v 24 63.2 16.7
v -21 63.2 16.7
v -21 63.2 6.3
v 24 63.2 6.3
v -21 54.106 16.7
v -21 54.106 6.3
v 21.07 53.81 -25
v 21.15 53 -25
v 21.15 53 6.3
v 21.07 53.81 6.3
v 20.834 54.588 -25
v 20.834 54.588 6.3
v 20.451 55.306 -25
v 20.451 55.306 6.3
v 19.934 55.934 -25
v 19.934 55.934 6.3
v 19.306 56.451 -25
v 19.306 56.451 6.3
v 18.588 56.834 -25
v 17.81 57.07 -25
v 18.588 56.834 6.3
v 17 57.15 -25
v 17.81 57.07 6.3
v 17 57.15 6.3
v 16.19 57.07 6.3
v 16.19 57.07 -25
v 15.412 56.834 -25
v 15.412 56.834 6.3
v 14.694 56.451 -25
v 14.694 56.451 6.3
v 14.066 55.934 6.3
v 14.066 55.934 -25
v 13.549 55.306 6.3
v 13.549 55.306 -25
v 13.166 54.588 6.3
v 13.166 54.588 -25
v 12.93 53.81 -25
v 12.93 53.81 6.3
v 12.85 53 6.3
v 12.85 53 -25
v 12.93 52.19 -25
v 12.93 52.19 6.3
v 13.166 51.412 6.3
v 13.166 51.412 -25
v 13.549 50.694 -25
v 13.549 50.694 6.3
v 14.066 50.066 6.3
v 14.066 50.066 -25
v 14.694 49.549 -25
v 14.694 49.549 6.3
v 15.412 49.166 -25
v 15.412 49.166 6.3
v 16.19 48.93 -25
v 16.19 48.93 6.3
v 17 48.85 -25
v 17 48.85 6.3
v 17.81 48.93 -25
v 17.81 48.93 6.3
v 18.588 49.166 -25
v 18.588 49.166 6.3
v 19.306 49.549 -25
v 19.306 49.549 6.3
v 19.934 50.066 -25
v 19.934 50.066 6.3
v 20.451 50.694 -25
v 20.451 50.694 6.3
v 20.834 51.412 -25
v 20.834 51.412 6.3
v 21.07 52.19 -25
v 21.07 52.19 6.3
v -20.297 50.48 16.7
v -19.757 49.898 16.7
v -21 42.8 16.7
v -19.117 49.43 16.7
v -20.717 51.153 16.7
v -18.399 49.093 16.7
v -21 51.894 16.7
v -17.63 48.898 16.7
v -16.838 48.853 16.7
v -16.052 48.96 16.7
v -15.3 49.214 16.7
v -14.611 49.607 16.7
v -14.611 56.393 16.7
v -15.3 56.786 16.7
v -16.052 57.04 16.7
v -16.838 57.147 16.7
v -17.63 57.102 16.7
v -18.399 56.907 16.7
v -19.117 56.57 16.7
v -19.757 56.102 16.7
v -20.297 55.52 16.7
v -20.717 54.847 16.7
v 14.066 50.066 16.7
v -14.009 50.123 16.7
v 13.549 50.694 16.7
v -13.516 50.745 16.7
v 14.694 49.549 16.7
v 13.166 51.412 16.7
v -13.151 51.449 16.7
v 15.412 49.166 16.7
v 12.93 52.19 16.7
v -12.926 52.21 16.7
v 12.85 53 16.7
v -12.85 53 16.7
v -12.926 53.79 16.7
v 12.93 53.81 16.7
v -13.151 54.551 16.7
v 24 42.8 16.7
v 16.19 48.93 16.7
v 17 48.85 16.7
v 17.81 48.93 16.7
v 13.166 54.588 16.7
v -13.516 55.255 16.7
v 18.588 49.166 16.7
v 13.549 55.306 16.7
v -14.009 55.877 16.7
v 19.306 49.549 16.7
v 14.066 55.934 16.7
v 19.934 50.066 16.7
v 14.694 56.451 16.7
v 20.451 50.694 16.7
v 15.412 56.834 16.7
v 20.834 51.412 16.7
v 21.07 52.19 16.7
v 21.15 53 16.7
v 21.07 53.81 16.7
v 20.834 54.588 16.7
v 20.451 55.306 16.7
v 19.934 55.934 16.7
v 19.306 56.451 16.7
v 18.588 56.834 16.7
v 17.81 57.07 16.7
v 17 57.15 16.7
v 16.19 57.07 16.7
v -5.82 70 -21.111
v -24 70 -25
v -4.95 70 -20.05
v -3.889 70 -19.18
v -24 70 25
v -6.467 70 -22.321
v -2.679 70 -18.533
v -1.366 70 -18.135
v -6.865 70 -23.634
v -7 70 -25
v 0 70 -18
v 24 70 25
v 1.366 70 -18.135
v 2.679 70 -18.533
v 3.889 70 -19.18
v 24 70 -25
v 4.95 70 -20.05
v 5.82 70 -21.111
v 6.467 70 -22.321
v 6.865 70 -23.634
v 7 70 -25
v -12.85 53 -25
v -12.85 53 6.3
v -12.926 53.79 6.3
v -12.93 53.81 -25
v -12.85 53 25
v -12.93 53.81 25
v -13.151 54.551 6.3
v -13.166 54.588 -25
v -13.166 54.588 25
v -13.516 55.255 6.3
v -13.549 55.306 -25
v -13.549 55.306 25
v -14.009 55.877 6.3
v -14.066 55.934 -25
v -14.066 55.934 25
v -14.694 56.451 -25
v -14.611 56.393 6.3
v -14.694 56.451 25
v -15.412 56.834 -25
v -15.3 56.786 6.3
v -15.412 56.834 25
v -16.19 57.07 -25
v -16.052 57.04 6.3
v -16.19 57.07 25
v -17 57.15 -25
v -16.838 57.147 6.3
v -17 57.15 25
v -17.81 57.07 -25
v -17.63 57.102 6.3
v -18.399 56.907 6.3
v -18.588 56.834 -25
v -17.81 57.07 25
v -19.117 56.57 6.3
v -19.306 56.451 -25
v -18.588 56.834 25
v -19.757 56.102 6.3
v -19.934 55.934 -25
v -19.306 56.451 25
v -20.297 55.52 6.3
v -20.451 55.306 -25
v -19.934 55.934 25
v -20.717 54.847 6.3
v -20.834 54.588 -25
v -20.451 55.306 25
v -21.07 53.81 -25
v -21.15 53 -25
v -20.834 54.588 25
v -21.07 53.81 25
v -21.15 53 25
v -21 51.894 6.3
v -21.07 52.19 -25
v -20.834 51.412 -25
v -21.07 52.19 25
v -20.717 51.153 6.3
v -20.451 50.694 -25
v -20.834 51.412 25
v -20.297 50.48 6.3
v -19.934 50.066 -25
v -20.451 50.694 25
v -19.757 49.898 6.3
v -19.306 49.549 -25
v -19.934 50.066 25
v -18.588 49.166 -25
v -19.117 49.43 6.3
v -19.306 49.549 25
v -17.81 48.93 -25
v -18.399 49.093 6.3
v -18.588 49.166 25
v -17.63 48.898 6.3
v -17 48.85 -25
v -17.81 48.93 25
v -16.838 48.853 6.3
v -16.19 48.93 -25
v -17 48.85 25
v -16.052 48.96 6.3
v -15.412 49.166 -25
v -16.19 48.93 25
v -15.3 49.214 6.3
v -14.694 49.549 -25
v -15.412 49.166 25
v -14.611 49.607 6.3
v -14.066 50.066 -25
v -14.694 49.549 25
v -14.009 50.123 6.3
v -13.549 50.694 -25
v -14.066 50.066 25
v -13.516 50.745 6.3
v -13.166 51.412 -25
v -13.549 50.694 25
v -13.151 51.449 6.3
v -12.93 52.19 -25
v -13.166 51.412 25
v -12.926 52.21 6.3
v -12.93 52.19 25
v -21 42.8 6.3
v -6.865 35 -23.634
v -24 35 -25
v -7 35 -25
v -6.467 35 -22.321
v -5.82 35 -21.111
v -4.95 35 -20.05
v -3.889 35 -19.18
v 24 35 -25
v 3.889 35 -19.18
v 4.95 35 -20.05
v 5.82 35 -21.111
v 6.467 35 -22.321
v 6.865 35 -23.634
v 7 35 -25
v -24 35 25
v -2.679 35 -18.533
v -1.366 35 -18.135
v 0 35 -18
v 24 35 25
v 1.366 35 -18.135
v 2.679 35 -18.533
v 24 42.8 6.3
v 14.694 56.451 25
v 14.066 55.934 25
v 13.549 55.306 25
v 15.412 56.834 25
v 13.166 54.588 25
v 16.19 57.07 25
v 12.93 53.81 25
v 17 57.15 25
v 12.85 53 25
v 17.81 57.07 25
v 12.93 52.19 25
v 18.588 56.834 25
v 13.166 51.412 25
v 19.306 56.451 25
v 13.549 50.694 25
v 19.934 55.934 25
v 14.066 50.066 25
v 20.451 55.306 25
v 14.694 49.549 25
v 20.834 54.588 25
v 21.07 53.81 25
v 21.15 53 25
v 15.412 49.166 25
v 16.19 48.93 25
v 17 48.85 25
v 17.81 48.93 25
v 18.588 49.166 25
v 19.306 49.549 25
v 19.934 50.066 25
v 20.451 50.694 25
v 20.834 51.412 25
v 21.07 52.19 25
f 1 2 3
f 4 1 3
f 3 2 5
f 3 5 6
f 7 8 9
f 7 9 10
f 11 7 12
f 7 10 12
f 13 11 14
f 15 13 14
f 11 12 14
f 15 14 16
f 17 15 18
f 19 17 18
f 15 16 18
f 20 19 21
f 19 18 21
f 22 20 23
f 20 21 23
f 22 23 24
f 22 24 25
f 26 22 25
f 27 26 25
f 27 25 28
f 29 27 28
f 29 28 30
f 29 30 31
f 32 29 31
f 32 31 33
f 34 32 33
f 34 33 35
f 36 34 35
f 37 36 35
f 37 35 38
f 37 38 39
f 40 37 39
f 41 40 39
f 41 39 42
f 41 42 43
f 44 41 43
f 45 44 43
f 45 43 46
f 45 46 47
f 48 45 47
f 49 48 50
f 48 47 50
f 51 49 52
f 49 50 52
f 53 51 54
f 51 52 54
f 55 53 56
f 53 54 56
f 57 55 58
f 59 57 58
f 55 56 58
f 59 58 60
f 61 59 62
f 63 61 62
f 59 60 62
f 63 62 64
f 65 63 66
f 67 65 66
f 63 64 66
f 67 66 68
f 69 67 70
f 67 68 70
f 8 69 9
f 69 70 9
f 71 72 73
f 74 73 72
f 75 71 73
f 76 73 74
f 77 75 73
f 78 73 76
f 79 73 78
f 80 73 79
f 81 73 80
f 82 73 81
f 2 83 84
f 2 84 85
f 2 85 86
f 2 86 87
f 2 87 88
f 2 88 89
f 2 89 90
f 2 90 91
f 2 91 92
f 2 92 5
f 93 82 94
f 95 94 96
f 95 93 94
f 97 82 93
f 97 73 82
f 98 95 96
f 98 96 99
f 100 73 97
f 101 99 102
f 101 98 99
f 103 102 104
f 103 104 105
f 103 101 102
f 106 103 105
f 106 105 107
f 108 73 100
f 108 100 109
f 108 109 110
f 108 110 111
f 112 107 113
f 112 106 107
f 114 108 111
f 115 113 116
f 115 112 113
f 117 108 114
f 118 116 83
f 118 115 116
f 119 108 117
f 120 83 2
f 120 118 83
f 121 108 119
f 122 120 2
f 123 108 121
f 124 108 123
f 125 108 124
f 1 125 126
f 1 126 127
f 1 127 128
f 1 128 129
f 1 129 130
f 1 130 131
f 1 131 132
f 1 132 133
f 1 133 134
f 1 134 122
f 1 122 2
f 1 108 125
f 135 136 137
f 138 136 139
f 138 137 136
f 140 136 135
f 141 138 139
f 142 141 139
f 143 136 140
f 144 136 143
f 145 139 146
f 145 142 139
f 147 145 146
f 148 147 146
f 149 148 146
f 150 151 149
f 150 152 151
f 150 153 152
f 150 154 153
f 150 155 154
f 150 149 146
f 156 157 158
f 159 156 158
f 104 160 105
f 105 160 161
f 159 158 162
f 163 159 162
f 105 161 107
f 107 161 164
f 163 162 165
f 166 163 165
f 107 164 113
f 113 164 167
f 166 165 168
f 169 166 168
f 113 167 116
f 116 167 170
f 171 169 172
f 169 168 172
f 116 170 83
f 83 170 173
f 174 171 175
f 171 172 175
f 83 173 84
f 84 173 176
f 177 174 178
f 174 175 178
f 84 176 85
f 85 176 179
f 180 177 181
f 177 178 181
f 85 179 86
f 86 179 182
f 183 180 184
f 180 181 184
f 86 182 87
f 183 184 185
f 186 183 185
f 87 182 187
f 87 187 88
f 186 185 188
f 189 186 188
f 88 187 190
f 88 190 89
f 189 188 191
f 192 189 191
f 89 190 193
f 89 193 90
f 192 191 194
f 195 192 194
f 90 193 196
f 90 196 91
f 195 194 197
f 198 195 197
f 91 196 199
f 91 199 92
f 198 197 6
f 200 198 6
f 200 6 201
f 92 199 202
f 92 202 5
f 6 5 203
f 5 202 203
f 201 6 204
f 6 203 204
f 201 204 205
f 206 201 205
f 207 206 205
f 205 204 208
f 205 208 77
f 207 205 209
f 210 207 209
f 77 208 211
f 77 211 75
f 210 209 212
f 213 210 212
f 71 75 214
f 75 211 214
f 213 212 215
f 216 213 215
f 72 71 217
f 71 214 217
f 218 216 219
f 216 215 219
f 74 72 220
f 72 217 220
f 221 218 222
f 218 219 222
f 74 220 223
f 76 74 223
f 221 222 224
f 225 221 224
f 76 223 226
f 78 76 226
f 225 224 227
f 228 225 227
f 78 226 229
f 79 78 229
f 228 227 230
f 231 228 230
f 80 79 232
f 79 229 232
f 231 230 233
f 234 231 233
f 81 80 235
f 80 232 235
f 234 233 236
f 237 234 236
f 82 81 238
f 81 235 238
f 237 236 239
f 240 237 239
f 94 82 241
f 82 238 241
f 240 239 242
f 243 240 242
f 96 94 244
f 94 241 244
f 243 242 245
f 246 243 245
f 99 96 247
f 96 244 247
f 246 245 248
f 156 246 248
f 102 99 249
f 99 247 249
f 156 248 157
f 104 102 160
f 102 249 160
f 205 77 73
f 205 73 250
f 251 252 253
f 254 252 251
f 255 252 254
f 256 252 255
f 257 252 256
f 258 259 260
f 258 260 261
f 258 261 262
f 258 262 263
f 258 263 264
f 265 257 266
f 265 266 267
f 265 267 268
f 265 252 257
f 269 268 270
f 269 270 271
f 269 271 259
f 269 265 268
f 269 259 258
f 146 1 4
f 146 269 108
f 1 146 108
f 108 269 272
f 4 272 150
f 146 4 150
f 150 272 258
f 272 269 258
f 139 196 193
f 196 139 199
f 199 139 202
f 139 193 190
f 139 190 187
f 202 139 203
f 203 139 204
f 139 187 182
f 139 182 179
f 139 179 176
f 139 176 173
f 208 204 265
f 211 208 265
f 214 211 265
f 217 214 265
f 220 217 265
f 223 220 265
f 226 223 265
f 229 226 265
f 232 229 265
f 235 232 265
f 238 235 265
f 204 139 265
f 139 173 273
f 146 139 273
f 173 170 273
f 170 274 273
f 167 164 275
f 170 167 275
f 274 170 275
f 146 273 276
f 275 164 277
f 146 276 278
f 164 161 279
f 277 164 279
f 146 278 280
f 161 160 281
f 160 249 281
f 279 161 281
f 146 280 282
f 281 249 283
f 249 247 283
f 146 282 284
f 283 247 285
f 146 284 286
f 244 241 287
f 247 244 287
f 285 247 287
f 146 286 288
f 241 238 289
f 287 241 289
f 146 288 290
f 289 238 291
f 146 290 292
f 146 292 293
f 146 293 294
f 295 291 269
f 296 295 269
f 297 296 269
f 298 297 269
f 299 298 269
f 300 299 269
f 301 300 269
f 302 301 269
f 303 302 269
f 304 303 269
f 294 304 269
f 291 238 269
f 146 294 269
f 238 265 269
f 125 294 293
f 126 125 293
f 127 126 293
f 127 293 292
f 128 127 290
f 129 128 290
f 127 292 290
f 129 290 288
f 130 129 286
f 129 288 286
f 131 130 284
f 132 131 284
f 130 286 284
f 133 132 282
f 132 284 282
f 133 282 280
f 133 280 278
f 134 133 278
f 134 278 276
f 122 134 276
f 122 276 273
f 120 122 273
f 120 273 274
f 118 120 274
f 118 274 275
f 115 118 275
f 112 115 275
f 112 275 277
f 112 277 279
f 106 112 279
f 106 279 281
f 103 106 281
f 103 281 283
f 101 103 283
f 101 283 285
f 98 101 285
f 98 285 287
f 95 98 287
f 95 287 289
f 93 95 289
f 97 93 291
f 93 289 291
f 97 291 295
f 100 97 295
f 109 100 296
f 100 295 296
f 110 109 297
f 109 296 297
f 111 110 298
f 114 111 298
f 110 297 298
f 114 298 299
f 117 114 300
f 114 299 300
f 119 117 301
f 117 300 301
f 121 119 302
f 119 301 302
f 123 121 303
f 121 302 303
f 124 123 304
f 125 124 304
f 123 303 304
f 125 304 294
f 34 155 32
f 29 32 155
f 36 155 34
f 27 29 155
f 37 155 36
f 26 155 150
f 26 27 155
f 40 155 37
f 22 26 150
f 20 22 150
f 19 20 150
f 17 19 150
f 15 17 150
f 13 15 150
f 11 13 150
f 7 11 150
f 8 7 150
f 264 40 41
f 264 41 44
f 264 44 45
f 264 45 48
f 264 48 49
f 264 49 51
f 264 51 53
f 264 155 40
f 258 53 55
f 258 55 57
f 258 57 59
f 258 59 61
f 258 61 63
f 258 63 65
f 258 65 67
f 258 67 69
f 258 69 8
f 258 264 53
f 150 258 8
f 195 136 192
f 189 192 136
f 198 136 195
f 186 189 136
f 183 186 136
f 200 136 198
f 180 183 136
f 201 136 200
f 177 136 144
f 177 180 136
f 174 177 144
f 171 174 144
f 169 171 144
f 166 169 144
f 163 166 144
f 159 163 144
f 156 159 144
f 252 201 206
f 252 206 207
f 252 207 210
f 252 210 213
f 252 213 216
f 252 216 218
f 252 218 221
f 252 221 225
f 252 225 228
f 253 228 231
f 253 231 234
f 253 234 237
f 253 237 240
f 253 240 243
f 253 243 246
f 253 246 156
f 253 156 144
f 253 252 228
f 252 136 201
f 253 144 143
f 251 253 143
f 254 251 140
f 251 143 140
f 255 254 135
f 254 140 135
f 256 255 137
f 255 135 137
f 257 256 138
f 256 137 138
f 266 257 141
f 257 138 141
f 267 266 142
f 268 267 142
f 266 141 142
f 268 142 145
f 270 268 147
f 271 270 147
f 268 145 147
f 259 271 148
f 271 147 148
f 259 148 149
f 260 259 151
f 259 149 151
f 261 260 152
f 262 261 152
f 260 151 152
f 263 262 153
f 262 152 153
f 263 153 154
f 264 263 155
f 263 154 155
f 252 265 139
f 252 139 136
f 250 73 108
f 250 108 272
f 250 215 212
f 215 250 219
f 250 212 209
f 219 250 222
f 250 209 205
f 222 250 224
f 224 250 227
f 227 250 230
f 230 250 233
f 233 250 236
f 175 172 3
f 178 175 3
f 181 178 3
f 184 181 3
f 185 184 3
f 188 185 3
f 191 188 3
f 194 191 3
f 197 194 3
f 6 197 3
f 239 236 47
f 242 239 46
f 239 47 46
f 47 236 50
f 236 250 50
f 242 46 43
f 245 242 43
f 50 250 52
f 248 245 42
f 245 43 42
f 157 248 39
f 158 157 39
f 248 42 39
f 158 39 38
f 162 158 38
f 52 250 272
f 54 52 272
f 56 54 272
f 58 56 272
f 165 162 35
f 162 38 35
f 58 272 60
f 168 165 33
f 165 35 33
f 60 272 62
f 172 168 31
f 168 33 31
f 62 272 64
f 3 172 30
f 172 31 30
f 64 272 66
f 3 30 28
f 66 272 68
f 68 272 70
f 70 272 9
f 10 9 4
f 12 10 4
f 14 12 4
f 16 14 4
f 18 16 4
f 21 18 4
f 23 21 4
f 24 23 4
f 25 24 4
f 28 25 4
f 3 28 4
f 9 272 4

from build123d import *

# Parameters (mm, degrees)
SKETCH1_W               = 48
SKETCH1_H               = 50
BOSS_EXTRUDE1_DEPTH     = 70
SKETCH2_W               = 10.4
SKETCH2_H               = 20.4
CUT_EXTRUDE1_DEPTH      = 45
SKETCH3_R               = 4.15
CUT_EXTRUDE2_DEPTH      = 51
CUT_EXTRUDE3_DEPTH      = 1
CUT_EXTRUDE3_DEPTH_BACK = 71
SKETCH5_W               = 48
SKETCH5_H               = 50
CUT_EXTRUDE4_DEPTH      = 35


with BuildPart() as part:
    # Sketch1 → Boss-Extrude1 (new body)
    with BuildSketch(Plane(origin=(0, 0, 0), x_dir=(1, 0, 0), z_dir=(0, 1, 0))):
        Rectangle(SKETCH1_W, SKETCH1_H)
    extrude(amount=BOSS_EXTRUDE1_DEPTH)

    # Sketch2 → Cut-Extrude1 (cut)
    with BuildSketch(Plane(origin=(24, 0, 0), x_dir=(0, 0, -1), z_dir=(1, 0, 0))):
        with Locations((-11.5, 53)):
            Rectangle(SKETCH2_W, SKETCH2_H)
        with Locations((-11.5, 17)):
            Rectangle(SKETCH2_W, SKETCH2_H)
    extrude(amount=-CUT_EXTRUDE1_DEPTH, mode=Mode.SUBTRACT)

    # Sketch3 → Cut-Extrude2 (cut, through all)
    with BuildSketch(Plane.XY.offset(25)):
        with Locations((17, 53)):
            Circle(SKETCH3_R)
        with Locations((-17, 53)):
            Circle(SKETCH3_R)
        with Locations((-17, 17)):
            Circle(SKETCH3_R)
        with Locations((17, 17)):
            Circle(SKETCH3_R)
    extrude(amount=-CUT_EXTRUDE2_DEPTH, mode=Mode.SUBTRACT)

    # Sketch4 → Cut-Extrude3 (cut, two sides)
    with BuildSketch(Plane(origin=(0, 70, 0), x_dir=(1, 0, 0), z_dir=(0, 1, 0))) as cut_extrude3_sk:
        with BuildLine():
            Line((-7, 152.660528641), (-7, 25))
            ThreePointArc((-7, 25), (0, 18), (7, 25))
            Line((7, 25), (7, 152.660528641))
            Line((7, 152.660528641), (7, 407.981585922))
            Line((7, 407.981585922), (-7, 407.981585922))
            Line((-7, 407.981585922), (-7, 152.660528641))
        make_face()
    extrude(amount=CUT_EXTRUDE3_DEPTH, mode=Mode.SUBTRACT)
    extrude(cut_extrude3_sk.sketch, amount=-CUT_EXTRUDE3_DEPTH_BACK, mode=Mode.SUBTRACT)

    # Sketch5 → Cut-Extrude4 (cut)
    with BuildSketch(Plane.XZ):
        Rectangle(SKETCH5_W, SKETCH5_H)
    extrude(amount=-CUT_EXTRUDE4_DEPTH, mode=Mode.SUBTRACT)


solid = part.part
